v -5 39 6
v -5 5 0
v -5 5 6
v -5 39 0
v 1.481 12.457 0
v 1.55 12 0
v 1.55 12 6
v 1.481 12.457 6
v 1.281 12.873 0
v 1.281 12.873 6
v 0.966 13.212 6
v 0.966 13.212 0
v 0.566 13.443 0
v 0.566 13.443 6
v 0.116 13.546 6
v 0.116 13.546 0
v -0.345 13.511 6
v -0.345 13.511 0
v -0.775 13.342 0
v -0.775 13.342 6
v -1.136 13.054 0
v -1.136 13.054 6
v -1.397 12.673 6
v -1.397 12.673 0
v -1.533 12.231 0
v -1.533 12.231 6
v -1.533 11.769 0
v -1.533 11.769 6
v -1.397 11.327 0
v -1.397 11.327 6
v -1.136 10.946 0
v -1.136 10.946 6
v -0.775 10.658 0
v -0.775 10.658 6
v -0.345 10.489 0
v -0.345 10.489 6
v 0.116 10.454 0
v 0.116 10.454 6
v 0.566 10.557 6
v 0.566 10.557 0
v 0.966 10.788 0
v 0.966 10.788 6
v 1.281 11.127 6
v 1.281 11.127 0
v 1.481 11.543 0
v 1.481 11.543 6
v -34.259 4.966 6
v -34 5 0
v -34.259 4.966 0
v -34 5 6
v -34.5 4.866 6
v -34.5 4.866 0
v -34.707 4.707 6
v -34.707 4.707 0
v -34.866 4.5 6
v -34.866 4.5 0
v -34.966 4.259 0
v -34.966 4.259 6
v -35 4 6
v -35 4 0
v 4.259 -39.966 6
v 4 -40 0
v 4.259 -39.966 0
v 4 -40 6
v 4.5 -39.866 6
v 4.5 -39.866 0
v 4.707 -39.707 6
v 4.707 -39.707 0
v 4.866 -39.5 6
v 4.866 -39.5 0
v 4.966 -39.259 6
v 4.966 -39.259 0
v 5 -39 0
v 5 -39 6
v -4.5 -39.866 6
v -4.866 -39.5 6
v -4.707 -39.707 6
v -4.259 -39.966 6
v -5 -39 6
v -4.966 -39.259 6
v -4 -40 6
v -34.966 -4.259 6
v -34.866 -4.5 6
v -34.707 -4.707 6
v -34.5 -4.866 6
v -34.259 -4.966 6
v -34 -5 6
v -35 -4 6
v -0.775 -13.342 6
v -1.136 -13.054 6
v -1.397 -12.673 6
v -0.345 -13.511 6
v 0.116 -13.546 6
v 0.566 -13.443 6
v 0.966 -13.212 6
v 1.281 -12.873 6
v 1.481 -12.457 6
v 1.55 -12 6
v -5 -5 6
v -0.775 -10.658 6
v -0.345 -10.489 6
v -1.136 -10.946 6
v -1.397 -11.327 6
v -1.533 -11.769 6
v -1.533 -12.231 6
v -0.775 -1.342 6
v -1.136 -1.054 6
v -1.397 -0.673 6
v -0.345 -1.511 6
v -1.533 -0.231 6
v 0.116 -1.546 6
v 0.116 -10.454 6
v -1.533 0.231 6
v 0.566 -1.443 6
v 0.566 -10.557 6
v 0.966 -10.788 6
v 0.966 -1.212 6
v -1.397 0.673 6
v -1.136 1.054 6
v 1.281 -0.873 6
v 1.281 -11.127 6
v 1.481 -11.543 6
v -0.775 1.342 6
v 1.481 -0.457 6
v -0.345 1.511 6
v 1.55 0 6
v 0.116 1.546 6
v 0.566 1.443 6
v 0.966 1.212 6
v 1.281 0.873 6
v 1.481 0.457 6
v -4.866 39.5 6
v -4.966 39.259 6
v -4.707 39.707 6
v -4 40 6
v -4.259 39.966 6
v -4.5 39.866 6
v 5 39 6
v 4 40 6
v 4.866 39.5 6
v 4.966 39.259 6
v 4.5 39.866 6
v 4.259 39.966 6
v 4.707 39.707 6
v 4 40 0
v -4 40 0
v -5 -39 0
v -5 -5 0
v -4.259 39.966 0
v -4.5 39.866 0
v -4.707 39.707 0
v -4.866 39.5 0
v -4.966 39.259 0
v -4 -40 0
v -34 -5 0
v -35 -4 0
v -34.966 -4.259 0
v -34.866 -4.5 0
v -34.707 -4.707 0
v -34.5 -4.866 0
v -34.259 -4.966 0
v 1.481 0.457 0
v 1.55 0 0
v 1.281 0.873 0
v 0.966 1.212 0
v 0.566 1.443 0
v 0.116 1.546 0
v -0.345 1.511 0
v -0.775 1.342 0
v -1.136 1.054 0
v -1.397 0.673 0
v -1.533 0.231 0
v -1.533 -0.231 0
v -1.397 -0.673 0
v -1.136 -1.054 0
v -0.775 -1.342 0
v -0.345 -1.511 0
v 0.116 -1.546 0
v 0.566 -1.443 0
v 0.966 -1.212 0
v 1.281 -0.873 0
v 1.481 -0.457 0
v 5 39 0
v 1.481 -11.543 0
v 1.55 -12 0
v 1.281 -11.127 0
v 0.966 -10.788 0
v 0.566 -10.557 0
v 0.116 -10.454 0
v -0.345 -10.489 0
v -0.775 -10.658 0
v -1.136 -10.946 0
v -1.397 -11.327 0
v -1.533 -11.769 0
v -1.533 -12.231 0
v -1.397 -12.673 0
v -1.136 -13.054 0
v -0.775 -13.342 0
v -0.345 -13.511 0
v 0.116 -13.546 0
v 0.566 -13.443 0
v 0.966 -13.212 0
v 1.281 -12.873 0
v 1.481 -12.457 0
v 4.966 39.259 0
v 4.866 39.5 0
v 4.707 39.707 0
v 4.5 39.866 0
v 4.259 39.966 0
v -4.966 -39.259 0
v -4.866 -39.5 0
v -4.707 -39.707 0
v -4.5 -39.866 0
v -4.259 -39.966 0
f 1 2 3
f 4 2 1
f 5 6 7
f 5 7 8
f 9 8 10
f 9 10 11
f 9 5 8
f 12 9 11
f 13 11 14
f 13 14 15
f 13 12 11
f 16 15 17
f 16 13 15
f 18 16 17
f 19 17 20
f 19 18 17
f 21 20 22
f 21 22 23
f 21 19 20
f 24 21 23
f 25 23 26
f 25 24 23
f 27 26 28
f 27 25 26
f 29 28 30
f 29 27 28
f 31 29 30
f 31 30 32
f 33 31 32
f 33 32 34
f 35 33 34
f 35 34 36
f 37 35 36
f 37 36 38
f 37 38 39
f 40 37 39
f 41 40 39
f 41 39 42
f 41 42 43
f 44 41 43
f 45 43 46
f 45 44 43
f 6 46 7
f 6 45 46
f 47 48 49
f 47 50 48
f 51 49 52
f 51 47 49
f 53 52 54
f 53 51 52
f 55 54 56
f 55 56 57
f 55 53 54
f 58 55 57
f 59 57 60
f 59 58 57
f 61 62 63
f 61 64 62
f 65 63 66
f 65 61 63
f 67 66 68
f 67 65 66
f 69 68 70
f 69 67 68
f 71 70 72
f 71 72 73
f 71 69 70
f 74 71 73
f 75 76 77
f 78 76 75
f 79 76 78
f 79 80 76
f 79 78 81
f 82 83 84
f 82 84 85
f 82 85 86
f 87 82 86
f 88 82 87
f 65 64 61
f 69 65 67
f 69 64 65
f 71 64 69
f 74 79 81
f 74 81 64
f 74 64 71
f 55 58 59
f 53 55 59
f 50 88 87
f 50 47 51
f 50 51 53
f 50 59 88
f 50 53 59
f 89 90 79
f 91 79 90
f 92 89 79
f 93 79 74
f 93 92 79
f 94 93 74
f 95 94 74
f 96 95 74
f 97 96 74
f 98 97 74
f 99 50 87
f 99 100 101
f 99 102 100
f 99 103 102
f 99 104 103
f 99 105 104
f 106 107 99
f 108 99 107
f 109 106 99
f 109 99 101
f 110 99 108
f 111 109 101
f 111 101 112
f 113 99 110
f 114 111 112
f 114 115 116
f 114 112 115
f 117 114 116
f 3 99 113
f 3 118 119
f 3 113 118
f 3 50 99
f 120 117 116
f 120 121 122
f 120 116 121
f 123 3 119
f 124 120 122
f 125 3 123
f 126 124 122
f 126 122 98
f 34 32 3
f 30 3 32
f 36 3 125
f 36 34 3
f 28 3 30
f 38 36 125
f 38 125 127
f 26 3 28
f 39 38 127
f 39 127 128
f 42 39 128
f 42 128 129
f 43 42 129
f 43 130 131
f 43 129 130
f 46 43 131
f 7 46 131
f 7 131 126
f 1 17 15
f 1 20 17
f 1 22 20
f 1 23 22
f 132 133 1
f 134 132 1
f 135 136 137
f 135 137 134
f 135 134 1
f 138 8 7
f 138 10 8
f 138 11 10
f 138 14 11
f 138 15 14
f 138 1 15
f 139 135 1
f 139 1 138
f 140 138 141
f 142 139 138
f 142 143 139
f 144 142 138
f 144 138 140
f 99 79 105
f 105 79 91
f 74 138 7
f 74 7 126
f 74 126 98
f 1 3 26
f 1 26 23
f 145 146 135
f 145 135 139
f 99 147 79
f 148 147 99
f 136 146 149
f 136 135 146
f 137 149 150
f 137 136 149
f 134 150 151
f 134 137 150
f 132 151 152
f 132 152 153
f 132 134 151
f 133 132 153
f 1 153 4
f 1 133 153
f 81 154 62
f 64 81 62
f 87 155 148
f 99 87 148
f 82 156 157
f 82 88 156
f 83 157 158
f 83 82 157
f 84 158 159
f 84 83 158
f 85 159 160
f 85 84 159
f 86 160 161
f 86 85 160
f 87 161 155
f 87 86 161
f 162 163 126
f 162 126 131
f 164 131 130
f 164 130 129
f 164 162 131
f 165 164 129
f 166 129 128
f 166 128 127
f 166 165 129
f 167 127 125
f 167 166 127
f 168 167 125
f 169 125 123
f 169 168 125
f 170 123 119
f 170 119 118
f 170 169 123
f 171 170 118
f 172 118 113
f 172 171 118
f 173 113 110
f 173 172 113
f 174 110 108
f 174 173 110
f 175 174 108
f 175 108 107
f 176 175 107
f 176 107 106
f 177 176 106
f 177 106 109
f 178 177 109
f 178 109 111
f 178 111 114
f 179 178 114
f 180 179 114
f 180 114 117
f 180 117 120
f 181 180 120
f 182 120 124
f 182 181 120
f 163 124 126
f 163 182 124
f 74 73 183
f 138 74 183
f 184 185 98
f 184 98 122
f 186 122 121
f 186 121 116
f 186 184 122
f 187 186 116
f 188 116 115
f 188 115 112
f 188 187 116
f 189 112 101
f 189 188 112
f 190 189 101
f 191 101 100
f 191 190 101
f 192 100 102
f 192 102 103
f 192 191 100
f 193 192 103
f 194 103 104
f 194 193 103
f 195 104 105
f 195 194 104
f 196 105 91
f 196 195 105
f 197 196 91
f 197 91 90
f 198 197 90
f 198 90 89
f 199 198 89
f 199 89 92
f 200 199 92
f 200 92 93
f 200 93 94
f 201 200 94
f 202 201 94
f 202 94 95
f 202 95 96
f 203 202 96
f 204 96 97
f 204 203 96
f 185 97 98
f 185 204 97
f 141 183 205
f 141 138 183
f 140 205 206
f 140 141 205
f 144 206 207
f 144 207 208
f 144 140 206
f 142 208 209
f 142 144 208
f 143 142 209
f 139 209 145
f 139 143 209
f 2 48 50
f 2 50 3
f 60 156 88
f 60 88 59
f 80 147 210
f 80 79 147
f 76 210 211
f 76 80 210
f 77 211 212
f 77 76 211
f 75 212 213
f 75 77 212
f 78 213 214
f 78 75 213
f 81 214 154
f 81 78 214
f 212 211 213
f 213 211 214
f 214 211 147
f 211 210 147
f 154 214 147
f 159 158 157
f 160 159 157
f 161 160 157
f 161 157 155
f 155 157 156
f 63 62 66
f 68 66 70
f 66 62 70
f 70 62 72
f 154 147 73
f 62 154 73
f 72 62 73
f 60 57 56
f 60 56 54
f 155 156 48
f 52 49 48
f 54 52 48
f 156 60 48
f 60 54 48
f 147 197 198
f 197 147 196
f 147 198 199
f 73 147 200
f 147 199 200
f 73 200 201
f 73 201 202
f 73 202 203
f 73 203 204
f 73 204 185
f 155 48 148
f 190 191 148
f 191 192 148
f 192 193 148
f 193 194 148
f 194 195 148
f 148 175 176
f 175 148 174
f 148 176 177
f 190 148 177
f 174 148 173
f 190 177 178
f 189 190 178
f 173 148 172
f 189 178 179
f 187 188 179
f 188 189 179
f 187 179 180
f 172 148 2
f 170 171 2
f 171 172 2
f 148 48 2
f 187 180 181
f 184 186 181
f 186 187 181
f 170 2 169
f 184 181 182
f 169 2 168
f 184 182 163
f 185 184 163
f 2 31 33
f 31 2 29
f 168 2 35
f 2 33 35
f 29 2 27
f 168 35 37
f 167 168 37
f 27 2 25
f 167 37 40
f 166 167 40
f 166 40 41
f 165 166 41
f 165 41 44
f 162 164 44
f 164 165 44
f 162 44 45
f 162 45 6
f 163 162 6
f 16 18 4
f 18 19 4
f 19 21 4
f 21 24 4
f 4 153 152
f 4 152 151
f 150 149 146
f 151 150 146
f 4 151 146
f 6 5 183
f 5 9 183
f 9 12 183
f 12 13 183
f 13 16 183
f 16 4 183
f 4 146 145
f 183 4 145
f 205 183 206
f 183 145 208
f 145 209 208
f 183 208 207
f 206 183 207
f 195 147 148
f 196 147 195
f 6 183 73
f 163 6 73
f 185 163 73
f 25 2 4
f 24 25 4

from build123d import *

# Parameters (mm, degrees)
SKETCH_1_W      = 10
SKETCH_1_H      = 80
SKETCH_1_R      = 1.55
SKETCH_1_W_2    = 30
SKETCH_1_H_2    = 10
EXTRUDE_1_DEPTH = 6
FILLET_1_R      = 1


with BuildPart() as part:
    # 草图1 → 凸台-拉伸1 (new body)
    with BuildSketch(Plane.XY):
        Rectangle(SKETCH_1_W, SKETCH_1_H)
        with Locations((0, 12)):
            Circle(SKETCH_1_R, mode=Mode.SUBTRACT)
        Circle(SKETCH_1_R, mode=Mode.SUBTRACT)
        with Locations((0, -12)):
            Circle(SKETCH_1_R, mode=Mode.SUBTRACT)
        with Locations((-20, 0)):
            Rectangle(SKETCH_1_W_2, SKETCH_1_H_2)
    extrude(amount=EXTRUDE_1_DEPTH)

    # 圆角1
    fillet_1_edges = [part.edges().sort_by_distance(p)[0] for p in [
        (-5, 40, 3),
        (5, 40, 3),
        (5, -40, 3),
        (-5, -40, 3),
        (-35, -5, 3),
        (-35, 5, 3),
    ]]
    fillet(fillet_1_edges, radius=FILLET_1_R)


solid = part.part
